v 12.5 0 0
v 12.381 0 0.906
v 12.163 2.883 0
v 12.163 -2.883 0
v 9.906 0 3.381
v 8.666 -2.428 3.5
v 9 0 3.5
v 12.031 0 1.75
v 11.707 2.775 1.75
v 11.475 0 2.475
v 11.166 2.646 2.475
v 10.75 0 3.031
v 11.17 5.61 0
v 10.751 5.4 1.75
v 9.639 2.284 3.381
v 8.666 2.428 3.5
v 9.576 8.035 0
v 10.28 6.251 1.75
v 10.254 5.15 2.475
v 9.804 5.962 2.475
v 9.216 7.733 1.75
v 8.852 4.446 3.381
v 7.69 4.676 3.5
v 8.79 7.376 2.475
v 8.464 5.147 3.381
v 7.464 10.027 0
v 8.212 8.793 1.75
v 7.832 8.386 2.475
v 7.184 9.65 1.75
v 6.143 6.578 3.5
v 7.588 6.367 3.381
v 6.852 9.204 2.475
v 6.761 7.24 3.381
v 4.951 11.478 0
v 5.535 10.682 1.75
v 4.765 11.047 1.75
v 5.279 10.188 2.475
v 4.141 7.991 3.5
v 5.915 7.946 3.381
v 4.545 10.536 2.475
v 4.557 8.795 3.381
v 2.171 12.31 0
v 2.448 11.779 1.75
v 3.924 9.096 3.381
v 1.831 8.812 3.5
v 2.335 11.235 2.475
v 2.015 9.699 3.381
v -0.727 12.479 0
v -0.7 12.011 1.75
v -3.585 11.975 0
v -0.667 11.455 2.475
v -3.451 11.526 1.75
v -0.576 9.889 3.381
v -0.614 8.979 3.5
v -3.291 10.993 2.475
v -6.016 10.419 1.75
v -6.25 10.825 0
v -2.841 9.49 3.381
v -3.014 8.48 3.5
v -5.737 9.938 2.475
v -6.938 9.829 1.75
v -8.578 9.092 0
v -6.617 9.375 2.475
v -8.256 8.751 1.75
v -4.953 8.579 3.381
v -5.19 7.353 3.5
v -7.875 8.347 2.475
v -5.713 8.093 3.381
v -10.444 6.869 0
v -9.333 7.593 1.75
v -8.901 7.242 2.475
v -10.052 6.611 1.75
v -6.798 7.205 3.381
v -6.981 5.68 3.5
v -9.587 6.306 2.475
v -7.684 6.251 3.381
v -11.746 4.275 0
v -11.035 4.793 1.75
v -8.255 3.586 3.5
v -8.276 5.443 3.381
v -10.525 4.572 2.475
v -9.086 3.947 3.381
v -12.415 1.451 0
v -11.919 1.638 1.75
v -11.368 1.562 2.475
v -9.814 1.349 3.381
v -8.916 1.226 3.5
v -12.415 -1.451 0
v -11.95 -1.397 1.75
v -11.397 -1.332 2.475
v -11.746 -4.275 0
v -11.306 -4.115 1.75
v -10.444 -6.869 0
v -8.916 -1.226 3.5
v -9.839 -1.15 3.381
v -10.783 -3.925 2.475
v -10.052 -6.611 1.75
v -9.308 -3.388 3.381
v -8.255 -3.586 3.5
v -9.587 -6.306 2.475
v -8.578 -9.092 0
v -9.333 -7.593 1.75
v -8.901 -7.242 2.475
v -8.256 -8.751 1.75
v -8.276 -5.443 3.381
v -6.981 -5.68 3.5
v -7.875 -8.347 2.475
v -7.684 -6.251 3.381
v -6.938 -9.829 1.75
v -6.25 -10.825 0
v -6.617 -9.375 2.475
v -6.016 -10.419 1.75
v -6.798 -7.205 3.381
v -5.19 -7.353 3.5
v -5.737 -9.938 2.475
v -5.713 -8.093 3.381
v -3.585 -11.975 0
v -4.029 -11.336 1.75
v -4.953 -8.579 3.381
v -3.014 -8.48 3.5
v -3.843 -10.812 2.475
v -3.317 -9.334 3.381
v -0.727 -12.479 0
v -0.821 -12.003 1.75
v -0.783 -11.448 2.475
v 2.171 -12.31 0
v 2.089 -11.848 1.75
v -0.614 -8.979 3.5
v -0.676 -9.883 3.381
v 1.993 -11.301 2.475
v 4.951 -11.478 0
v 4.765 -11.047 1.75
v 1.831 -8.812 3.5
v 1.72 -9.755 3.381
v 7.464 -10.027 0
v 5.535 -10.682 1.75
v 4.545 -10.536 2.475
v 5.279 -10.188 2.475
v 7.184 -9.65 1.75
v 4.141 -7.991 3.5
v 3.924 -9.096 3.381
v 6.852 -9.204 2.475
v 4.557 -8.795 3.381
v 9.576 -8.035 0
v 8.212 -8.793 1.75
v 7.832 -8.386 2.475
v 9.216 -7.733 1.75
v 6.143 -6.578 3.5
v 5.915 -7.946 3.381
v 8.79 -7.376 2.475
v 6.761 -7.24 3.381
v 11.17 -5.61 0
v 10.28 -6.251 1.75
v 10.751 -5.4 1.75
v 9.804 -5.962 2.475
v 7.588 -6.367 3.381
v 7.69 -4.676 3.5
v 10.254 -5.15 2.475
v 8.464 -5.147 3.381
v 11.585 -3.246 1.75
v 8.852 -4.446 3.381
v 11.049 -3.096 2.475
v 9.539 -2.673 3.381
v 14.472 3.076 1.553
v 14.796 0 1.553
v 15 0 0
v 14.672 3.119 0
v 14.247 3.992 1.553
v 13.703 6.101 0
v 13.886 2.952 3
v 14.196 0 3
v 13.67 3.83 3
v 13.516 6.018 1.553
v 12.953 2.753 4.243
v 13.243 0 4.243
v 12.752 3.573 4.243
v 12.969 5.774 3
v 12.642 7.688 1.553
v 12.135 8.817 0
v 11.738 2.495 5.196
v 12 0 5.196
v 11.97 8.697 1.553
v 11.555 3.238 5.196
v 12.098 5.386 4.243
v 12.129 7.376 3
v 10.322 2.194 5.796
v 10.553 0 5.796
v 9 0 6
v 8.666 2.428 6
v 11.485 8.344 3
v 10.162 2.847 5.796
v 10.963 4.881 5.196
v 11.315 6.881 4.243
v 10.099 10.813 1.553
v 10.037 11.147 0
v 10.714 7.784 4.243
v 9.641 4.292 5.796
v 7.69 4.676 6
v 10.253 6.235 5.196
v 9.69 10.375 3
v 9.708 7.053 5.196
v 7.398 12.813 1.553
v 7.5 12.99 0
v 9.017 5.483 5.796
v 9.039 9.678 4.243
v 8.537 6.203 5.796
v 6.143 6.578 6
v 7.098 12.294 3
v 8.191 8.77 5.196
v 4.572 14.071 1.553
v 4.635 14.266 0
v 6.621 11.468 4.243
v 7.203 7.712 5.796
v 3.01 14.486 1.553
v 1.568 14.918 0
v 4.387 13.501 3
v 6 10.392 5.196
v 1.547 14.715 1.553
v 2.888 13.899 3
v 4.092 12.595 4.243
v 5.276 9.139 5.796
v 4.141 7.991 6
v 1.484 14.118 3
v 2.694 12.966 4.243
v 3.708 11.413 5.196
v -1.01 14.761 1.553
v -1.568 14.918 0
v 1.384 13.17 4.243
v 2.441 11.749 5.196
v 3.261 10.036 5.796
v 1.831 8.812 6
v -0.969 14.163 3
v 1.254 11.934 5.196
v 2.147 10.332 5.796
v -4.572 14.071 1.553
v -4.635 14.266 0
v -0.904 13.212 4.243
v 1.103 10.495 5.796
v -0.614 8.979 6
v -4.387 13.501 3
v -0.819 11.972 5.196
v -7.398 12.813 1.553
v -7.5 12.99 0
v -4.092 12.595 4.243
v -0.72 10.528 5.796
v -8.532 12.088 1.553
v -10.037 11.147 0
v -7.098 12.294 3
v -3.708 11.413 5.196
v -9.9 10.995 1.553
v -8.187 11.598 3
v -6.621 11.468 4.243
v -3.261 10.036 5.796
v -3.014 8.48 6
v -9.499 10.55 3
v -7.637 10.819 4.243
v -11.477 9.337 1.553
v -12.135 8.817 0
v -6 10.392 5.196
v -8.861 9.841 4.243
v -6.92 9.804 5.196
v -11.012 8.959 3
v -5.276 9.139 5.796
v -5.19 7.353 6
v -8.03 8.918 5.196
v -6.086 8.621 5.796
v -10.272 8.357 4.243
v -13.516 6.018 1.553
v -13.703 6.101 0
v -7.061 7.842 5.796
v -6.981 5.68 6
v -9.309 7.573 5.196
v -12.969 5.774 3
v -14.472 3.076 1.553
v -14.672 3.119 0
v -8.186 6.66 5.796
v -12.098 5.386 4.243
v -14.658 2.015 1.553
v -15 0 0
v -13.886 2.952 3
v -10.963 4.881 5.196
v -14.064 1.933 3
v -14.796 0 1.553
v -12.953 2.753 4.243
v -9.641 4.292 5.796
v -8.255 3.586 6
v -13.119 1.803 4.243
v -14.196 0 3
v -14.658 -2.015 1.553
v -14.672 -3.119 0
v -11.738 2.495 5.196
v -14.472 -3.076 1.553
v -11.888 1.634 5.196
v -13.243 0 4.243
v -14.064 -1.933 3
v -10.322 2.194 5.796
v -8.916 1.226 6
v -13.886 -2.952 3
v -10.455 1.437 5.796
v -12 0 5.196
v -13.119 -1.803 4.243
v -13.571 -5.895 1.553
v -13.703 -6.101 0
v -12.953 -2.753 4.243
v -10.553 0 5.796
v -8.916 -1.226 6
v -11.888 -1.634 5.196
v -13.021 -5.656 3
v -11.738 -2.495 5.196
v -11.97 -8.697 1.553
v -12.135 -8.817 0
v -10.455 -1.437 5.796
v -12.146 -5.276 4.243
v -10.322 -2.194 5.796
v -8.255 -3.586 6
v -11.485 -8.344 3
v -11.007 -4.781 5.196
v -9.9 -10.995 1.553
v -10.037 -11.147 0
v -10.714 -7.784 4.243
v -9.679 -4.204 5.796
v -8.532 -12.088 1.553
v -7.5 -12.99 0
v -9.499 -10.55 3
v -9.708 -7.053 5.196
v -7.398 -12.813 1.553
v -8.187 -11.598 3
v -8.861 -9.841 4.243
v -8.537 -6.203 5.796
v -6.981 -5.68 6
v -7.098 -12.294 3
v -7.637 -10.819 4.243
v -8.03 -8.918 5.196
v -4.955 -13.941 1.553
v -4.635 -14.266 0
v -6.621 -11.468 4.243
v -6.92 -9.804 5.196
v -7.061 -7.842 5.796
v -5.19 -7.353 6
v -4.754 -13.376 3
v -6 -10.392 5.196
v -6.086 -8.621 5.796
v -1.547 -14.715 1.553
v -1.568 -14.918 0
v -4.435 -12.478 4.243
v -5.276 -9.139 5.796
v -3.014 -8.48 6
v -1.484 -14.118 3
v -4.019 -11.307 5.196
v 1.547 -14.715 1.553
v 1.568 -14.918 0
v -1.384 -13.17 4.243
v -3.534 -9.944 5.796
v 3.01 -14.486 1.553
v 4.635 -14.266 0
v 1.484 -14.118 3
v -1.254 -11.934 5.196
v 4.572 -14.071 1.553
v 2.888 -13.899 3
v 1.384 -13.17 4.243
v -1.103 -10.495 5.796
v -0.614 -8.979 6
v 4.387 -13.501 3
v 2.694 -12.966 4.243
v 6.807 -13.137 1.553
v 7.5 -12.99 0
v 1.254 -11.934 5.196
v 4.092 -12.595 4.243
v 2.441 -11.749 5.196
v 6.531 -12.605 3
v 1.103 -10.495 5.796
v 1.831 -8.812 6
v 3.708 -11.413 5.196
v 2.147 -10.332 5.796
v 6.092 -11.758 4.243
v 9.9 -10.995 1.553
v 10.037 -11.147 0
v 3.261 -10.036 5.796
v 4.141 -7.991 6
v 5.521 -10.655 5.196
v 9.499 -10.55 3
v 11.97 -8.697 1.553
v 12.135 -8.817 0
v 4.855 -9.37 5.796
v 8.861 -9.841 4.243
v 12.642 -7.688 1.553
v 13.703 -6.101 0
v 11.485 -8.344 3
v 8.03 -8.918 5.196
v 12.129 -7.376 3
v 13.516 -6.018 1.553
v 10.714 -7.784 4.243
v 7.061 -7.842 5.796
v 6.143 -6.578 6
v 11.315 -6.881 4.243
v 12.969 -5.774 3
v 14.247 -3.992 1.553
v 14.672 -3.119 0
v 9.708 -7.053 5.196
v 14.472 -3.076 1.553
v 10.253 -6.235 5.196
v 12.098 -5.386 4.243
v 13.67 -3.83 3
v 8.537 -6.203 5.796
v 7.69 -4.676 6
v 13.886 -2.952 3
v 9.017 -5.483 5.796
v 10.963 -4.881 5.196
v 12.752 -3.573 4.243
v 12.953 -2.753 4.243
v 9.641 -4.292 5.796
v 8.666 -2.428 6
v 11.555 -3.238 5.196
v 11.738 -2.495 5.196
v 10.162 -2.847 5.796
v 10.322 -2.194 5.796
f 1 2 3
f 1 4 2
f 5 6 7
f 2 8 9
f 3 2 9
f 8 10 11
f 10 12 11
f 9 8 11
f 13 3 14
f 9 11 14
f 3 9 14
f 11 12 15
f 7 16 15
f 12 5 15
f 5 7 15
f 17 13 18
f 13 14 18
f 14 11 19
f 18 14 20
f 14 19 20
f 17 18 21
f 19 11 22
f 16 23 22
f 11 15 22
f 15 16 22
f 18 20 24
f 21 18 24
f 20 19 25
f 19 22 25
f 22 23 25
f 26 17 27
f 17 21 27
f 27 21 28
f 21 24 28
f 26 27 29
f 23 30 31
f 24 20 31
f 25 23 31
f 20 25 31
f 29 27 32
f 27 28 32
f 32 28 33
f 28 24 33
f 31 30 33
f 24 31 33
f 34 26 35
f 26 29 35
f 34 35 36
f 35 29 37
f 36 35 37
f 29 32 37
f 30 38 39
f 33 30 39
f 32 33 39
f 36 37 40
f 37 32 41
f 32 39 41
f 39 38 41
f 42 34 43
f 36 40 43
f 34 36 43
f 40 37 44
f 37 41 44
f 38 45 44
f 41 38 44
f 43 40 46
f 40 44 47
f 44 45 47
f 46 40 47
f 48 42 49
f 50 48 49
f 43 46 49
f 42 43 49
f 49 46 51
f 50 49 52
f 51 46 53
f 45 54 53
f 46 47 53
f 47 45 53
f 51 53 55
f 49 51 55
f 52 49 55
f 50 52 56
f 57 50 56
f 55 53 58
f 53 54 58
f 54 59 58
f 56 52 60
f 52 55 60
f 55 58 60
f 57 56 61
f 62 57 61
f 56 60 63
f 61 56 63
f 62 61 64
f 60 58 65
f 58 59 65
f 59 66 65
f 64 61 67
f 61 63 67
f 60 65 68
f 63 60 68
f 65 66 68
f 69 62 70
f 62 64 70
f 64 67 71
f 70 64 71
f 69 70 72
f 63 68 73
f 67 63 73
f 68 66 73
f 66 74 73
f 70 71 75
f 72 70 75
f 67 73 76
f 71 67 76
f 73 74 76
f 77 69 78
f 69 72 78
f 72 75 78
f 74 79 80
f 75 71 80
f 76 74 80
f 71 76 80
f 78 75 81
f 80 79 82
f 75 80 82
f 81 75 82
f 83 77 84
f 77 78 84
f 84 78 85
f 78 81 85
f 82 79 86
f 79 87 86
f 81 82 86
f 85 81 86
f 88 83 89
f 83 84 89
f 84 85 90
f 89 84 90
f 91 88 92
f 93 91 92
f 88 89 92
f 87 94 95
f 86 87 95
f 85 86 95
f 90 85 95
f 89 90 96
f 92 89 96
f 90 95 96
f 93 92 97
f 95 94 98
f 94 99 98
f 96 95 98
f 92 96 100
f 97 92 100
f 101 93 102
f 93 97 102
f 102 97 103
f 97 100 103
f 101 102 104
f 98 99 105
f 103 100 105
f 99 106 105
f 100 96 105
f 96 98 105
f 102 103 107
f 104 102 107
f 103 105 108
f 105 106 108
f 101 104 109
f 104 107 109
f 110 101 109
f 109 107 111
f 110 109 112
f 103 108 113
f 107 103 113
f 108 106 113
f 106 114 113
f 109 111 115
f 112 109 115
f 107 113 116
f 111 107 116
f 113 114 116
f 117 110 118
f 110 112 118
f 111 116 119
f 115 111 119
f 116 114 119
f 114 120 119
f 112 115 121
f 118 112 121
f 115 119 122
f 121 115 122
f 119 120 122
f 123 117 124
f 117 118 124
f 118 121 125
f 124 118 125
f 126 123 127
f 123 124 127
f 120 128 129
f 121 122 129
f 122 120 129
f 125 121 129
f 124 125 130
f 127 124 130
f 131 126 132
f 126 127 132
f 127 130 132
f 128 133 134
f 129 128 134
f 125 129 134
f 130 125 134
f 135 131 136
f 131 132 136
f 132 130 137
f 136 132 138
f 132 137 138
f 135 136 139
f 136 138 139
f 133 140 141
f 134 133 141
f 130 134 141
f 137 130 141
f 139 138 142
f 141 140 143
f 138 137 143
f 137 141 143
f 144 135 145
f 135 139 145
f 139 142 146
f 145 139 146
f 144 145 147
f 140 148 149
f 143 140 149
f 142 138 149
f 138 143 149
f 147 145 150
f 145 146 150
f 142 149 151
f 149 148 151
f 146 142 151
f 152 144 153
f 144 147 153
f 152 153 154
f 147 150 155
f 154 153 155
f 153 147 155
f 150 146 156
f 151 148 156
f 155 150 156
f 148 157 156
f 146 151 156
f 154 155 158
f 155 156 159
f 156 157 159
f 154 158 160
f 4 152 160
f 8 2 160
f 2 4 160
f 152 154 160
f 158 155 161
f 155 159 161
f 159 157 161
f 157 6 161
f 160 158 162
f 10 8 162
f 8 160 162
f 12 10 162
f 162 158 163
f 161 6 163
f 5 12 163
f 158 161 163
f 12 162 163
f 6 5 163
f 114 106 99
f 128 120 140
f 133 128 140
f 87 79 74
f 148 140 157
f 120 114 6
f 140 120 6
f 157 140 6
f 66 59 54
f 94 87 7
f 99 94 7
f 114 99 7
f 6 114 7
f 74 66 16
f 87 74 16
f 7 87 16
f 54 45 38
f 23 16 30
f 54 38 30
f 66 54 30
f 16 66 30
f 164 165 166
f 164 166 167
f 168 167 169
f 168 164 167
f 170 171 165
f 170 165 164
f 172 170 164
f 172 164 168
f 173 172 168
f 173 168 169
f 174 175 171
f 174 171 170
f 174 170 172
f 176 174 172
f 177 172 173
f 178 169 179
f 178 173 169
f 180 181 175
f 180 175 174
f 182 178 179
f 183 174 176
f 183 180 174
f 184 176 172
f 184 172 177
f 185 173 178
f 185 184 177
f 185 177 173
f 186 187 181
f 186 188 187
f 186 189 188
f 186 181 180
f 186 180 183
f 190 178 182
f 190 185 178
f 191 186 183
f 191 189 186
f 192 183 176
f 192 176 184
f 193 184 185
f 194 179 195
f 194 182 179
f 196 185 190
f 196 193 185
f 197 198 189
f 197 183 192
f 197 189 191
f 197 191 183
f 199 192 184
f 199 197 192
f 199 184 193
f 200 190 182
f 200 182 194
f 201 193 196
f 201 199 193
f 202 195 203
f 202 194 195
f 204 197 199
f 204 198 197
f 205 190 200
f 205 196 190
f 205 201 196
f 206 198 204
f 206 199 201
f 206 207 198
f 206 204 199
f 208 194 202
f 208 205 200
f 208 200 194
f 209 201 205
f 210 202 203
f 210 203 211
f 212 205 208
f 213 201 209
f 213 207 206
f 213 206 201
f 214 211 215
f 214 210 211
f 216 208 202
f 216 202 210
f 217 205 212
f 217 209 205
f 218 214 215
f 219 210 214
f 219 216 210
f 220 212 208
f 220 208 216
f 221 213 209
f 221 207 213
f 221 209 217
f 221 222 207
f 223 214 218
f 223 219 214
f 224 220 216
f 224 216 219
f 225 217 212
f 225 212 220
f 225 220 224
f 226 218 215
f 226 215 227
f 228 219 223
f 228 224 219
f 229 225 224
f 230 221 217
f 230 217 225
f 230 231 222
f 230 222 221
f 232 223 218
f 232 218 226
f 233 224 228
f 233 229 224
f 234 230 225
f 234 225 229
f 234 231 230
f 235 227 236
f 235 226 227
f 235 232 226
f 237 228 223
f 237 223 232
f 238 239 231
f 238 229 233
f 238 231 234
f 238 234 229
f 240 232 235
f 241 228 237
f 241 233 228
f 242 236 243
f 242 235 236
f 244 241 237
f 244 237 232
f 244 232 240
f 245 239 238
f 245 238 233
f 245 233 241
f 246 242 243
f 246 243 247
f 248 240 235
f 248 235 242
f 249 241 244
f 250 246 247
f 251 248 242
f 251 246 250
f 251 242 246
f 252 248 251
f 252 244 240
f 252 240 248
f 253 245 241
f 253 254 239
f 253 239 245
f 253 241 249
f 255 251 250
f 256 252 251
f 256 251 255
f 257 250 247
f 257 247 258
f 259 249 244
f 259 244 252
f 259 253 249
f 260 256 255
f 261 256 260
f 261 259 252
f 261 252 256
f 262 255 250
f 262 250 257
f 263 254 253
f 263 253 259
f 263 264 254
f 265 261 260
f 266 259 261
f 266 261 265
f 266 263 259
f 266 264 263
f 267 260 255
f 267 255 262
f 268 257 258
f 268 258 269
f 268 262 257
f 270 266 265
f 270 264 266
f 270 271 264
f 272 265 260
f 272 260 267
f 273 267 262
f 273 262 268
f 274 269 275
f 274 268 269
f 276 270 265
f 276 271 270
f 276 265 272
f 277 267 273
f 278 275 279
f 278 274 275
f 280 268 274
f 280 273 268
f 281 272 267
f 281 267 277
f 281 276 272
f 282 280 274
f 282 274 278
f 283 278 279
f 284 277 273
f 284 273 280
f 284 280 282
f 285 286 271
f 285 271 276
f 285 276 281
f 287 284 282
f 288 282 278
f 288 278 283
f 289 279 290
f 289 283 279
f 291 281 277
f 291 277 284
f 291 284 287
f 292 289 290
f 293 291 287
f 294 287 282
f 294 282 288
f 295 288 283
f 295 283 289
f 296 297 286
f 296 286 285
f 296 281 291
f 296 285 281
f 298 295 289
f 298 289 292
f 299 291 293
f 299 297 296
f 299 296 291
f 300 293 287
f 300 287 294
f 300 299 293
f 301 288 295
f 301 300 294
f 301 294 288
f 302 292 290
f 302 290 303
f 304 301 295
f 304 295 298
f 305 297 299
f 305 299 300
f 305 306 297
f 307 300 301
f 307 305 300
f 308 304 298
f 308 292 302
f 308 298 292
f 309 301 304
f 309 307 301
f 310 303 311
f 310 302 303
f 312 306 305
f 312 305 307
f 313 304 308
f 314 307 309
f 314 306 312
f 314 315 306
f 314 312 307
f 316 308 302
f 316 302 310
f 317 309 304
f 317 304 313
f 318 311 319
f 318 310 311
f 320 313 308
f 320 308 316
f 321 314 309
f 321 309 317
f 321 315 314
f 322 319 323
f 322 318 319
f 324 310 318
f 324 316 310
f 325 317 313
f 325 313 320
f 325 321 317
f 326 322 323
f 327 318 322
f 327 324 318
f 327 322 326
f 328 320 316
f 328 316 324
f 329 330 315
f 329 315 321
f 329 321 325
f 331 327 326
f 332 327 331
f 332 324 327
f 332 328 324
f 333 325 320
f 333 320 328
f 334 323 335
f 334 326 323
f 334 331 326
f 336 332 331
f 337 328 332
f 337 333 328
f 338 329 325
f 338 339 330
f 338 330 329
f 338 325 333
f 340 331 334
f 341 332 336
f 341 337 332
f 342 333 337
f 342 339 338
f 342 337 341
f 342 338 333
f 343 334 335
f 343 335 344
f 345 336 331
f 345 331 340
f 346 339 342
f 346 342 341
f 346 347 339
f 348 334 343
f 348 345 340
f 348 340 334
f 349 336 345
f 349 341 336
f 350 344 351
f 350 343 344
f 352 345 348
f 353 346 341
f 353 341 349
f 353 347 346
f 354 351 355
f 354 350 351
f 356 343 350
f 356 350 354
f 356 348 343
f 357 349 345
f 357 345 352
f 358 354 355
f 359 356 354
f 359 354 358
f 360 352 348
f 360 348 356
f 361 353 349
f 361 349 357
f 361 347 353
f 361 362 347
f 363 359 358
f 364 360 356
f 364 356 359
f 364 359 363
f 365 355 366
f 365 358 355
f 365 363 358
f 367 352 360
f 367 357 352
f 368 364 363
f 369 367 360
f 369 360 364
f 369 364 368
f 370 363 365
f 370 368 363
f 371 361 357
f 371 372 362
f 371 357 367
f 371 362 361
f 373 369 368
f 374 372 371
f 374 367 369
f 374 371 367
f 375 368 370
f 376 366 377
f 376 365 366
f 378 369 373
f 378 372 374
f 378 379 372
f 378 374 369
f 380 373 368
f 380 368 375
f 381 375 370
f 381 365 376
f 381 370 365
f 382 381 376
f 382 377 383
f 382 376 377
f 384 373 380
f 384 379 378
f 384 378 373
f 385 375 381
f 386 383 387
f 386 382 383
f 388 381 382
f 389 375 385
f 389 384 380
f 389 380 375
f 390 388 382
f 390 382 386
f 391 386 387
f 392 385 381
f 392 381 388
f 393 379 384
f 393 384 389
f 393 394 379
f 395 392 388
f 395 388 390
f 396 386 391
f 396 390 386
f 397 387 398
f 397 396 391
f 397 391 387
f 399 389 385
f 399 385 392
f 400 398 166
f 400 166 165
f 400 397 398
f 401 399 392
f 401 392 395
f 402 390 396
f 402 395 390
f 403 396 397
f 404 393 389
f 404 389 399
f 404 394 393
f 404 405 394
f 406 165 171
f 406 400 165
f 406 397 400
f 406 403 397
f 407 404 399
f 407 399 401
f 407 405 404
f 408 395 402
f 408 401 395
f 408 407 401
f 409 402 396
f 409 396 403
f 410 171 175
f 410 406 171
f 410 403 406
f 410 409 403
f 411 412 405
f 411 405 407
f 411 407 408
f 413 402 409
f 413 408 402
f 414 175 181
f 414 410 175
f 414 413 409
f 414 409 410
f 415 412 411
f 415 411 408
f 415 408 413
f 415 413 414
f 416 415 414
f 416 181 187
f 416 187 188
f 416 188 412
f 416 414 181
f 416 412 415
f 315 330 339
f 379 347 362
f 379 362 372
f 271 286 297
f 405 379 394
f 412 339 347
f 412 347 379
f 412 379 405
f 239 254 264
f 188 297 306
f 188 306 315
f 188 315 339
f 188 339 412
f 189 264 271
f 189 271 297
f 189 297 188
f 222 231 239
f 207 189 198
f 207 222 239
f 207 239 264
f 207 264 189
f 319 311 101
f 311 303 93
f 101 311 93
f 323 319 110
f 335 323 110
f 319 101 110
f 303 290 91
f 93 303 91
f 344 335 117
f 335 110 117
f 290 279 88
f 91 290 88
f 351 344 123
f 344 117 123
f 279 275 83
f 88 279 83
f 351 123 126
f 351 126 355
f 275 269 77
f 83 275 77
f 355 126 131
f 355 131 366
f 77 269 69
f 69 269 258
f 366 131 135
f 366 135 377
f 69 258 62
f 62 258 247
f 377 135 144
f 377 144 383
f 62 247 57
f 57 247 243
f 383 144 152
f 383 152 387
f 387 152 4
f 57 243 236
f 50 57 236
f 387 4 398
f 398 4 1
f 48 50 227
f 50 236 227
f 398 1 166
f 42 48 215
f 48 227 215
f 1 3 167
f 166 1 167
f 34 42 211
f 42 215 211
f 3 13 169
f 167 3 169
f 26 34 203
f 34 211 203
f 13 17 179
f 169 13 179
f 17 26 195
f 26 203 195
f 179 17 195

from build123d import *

# Parameters (mm, degrees)
F0_R     = 15
F1_DEPTH = 6
F2_R     = 5.99999
F3_T     = 2.5


# Not quite as in the source:
# - a fillet or chamfer is up to 0.001 mm smaller than in the source, because OpenCascade refuses the exact size
# - a shell that OpenCascade refuses in one call is made with other operations: the cavity is built on its own and cut out


with BuildPart() as f1:
    # F0 (on Top) → F1 (new body)
    with BuildSketch(Plane.XY):
        Circle(F0_R)
    extrude(amount=F1_DEPTH)

    # F2 (radius 6 in the source; OpenCascade refuses exactly that, so slightly less here)
    f2_edges = [f1.edges().sort_by_distance(p)[0] for p in [
        (-15, 0, 6),
    ]]
    fillet(f2_edges, radius=F2_R)

    # F3: shell of thickness 2.5, made by hand


with BuildPart() as f3_core1:
    # F3_t2: copy of F1
    add(f1.part)

    # the walls: a layer under each face that stays
    f3_faces = [f3_core1.faces().sort_by_distance(p)[0] for p in [
        (-15, 0, 5e-06),
        (-13.2426436161, 0, 4.2426436161),
        (0, 0, 6),
    ]]
    thicken(f3_faces, amount=-F3_T, mode=Mode.SUBTRACT)


with BuildPart() as f1_1:
    add(f1.part)

    # what is left inside the walls is the cavity
    f3_cavity = [f3_core1.part.solids().sort_by_distance(p)[0] for p in [
        (0, -4.166667, 0.025),
    ]]
    add(f3_cavity, mode=Mode.SUBTRACT)


solid = f1_1.part
